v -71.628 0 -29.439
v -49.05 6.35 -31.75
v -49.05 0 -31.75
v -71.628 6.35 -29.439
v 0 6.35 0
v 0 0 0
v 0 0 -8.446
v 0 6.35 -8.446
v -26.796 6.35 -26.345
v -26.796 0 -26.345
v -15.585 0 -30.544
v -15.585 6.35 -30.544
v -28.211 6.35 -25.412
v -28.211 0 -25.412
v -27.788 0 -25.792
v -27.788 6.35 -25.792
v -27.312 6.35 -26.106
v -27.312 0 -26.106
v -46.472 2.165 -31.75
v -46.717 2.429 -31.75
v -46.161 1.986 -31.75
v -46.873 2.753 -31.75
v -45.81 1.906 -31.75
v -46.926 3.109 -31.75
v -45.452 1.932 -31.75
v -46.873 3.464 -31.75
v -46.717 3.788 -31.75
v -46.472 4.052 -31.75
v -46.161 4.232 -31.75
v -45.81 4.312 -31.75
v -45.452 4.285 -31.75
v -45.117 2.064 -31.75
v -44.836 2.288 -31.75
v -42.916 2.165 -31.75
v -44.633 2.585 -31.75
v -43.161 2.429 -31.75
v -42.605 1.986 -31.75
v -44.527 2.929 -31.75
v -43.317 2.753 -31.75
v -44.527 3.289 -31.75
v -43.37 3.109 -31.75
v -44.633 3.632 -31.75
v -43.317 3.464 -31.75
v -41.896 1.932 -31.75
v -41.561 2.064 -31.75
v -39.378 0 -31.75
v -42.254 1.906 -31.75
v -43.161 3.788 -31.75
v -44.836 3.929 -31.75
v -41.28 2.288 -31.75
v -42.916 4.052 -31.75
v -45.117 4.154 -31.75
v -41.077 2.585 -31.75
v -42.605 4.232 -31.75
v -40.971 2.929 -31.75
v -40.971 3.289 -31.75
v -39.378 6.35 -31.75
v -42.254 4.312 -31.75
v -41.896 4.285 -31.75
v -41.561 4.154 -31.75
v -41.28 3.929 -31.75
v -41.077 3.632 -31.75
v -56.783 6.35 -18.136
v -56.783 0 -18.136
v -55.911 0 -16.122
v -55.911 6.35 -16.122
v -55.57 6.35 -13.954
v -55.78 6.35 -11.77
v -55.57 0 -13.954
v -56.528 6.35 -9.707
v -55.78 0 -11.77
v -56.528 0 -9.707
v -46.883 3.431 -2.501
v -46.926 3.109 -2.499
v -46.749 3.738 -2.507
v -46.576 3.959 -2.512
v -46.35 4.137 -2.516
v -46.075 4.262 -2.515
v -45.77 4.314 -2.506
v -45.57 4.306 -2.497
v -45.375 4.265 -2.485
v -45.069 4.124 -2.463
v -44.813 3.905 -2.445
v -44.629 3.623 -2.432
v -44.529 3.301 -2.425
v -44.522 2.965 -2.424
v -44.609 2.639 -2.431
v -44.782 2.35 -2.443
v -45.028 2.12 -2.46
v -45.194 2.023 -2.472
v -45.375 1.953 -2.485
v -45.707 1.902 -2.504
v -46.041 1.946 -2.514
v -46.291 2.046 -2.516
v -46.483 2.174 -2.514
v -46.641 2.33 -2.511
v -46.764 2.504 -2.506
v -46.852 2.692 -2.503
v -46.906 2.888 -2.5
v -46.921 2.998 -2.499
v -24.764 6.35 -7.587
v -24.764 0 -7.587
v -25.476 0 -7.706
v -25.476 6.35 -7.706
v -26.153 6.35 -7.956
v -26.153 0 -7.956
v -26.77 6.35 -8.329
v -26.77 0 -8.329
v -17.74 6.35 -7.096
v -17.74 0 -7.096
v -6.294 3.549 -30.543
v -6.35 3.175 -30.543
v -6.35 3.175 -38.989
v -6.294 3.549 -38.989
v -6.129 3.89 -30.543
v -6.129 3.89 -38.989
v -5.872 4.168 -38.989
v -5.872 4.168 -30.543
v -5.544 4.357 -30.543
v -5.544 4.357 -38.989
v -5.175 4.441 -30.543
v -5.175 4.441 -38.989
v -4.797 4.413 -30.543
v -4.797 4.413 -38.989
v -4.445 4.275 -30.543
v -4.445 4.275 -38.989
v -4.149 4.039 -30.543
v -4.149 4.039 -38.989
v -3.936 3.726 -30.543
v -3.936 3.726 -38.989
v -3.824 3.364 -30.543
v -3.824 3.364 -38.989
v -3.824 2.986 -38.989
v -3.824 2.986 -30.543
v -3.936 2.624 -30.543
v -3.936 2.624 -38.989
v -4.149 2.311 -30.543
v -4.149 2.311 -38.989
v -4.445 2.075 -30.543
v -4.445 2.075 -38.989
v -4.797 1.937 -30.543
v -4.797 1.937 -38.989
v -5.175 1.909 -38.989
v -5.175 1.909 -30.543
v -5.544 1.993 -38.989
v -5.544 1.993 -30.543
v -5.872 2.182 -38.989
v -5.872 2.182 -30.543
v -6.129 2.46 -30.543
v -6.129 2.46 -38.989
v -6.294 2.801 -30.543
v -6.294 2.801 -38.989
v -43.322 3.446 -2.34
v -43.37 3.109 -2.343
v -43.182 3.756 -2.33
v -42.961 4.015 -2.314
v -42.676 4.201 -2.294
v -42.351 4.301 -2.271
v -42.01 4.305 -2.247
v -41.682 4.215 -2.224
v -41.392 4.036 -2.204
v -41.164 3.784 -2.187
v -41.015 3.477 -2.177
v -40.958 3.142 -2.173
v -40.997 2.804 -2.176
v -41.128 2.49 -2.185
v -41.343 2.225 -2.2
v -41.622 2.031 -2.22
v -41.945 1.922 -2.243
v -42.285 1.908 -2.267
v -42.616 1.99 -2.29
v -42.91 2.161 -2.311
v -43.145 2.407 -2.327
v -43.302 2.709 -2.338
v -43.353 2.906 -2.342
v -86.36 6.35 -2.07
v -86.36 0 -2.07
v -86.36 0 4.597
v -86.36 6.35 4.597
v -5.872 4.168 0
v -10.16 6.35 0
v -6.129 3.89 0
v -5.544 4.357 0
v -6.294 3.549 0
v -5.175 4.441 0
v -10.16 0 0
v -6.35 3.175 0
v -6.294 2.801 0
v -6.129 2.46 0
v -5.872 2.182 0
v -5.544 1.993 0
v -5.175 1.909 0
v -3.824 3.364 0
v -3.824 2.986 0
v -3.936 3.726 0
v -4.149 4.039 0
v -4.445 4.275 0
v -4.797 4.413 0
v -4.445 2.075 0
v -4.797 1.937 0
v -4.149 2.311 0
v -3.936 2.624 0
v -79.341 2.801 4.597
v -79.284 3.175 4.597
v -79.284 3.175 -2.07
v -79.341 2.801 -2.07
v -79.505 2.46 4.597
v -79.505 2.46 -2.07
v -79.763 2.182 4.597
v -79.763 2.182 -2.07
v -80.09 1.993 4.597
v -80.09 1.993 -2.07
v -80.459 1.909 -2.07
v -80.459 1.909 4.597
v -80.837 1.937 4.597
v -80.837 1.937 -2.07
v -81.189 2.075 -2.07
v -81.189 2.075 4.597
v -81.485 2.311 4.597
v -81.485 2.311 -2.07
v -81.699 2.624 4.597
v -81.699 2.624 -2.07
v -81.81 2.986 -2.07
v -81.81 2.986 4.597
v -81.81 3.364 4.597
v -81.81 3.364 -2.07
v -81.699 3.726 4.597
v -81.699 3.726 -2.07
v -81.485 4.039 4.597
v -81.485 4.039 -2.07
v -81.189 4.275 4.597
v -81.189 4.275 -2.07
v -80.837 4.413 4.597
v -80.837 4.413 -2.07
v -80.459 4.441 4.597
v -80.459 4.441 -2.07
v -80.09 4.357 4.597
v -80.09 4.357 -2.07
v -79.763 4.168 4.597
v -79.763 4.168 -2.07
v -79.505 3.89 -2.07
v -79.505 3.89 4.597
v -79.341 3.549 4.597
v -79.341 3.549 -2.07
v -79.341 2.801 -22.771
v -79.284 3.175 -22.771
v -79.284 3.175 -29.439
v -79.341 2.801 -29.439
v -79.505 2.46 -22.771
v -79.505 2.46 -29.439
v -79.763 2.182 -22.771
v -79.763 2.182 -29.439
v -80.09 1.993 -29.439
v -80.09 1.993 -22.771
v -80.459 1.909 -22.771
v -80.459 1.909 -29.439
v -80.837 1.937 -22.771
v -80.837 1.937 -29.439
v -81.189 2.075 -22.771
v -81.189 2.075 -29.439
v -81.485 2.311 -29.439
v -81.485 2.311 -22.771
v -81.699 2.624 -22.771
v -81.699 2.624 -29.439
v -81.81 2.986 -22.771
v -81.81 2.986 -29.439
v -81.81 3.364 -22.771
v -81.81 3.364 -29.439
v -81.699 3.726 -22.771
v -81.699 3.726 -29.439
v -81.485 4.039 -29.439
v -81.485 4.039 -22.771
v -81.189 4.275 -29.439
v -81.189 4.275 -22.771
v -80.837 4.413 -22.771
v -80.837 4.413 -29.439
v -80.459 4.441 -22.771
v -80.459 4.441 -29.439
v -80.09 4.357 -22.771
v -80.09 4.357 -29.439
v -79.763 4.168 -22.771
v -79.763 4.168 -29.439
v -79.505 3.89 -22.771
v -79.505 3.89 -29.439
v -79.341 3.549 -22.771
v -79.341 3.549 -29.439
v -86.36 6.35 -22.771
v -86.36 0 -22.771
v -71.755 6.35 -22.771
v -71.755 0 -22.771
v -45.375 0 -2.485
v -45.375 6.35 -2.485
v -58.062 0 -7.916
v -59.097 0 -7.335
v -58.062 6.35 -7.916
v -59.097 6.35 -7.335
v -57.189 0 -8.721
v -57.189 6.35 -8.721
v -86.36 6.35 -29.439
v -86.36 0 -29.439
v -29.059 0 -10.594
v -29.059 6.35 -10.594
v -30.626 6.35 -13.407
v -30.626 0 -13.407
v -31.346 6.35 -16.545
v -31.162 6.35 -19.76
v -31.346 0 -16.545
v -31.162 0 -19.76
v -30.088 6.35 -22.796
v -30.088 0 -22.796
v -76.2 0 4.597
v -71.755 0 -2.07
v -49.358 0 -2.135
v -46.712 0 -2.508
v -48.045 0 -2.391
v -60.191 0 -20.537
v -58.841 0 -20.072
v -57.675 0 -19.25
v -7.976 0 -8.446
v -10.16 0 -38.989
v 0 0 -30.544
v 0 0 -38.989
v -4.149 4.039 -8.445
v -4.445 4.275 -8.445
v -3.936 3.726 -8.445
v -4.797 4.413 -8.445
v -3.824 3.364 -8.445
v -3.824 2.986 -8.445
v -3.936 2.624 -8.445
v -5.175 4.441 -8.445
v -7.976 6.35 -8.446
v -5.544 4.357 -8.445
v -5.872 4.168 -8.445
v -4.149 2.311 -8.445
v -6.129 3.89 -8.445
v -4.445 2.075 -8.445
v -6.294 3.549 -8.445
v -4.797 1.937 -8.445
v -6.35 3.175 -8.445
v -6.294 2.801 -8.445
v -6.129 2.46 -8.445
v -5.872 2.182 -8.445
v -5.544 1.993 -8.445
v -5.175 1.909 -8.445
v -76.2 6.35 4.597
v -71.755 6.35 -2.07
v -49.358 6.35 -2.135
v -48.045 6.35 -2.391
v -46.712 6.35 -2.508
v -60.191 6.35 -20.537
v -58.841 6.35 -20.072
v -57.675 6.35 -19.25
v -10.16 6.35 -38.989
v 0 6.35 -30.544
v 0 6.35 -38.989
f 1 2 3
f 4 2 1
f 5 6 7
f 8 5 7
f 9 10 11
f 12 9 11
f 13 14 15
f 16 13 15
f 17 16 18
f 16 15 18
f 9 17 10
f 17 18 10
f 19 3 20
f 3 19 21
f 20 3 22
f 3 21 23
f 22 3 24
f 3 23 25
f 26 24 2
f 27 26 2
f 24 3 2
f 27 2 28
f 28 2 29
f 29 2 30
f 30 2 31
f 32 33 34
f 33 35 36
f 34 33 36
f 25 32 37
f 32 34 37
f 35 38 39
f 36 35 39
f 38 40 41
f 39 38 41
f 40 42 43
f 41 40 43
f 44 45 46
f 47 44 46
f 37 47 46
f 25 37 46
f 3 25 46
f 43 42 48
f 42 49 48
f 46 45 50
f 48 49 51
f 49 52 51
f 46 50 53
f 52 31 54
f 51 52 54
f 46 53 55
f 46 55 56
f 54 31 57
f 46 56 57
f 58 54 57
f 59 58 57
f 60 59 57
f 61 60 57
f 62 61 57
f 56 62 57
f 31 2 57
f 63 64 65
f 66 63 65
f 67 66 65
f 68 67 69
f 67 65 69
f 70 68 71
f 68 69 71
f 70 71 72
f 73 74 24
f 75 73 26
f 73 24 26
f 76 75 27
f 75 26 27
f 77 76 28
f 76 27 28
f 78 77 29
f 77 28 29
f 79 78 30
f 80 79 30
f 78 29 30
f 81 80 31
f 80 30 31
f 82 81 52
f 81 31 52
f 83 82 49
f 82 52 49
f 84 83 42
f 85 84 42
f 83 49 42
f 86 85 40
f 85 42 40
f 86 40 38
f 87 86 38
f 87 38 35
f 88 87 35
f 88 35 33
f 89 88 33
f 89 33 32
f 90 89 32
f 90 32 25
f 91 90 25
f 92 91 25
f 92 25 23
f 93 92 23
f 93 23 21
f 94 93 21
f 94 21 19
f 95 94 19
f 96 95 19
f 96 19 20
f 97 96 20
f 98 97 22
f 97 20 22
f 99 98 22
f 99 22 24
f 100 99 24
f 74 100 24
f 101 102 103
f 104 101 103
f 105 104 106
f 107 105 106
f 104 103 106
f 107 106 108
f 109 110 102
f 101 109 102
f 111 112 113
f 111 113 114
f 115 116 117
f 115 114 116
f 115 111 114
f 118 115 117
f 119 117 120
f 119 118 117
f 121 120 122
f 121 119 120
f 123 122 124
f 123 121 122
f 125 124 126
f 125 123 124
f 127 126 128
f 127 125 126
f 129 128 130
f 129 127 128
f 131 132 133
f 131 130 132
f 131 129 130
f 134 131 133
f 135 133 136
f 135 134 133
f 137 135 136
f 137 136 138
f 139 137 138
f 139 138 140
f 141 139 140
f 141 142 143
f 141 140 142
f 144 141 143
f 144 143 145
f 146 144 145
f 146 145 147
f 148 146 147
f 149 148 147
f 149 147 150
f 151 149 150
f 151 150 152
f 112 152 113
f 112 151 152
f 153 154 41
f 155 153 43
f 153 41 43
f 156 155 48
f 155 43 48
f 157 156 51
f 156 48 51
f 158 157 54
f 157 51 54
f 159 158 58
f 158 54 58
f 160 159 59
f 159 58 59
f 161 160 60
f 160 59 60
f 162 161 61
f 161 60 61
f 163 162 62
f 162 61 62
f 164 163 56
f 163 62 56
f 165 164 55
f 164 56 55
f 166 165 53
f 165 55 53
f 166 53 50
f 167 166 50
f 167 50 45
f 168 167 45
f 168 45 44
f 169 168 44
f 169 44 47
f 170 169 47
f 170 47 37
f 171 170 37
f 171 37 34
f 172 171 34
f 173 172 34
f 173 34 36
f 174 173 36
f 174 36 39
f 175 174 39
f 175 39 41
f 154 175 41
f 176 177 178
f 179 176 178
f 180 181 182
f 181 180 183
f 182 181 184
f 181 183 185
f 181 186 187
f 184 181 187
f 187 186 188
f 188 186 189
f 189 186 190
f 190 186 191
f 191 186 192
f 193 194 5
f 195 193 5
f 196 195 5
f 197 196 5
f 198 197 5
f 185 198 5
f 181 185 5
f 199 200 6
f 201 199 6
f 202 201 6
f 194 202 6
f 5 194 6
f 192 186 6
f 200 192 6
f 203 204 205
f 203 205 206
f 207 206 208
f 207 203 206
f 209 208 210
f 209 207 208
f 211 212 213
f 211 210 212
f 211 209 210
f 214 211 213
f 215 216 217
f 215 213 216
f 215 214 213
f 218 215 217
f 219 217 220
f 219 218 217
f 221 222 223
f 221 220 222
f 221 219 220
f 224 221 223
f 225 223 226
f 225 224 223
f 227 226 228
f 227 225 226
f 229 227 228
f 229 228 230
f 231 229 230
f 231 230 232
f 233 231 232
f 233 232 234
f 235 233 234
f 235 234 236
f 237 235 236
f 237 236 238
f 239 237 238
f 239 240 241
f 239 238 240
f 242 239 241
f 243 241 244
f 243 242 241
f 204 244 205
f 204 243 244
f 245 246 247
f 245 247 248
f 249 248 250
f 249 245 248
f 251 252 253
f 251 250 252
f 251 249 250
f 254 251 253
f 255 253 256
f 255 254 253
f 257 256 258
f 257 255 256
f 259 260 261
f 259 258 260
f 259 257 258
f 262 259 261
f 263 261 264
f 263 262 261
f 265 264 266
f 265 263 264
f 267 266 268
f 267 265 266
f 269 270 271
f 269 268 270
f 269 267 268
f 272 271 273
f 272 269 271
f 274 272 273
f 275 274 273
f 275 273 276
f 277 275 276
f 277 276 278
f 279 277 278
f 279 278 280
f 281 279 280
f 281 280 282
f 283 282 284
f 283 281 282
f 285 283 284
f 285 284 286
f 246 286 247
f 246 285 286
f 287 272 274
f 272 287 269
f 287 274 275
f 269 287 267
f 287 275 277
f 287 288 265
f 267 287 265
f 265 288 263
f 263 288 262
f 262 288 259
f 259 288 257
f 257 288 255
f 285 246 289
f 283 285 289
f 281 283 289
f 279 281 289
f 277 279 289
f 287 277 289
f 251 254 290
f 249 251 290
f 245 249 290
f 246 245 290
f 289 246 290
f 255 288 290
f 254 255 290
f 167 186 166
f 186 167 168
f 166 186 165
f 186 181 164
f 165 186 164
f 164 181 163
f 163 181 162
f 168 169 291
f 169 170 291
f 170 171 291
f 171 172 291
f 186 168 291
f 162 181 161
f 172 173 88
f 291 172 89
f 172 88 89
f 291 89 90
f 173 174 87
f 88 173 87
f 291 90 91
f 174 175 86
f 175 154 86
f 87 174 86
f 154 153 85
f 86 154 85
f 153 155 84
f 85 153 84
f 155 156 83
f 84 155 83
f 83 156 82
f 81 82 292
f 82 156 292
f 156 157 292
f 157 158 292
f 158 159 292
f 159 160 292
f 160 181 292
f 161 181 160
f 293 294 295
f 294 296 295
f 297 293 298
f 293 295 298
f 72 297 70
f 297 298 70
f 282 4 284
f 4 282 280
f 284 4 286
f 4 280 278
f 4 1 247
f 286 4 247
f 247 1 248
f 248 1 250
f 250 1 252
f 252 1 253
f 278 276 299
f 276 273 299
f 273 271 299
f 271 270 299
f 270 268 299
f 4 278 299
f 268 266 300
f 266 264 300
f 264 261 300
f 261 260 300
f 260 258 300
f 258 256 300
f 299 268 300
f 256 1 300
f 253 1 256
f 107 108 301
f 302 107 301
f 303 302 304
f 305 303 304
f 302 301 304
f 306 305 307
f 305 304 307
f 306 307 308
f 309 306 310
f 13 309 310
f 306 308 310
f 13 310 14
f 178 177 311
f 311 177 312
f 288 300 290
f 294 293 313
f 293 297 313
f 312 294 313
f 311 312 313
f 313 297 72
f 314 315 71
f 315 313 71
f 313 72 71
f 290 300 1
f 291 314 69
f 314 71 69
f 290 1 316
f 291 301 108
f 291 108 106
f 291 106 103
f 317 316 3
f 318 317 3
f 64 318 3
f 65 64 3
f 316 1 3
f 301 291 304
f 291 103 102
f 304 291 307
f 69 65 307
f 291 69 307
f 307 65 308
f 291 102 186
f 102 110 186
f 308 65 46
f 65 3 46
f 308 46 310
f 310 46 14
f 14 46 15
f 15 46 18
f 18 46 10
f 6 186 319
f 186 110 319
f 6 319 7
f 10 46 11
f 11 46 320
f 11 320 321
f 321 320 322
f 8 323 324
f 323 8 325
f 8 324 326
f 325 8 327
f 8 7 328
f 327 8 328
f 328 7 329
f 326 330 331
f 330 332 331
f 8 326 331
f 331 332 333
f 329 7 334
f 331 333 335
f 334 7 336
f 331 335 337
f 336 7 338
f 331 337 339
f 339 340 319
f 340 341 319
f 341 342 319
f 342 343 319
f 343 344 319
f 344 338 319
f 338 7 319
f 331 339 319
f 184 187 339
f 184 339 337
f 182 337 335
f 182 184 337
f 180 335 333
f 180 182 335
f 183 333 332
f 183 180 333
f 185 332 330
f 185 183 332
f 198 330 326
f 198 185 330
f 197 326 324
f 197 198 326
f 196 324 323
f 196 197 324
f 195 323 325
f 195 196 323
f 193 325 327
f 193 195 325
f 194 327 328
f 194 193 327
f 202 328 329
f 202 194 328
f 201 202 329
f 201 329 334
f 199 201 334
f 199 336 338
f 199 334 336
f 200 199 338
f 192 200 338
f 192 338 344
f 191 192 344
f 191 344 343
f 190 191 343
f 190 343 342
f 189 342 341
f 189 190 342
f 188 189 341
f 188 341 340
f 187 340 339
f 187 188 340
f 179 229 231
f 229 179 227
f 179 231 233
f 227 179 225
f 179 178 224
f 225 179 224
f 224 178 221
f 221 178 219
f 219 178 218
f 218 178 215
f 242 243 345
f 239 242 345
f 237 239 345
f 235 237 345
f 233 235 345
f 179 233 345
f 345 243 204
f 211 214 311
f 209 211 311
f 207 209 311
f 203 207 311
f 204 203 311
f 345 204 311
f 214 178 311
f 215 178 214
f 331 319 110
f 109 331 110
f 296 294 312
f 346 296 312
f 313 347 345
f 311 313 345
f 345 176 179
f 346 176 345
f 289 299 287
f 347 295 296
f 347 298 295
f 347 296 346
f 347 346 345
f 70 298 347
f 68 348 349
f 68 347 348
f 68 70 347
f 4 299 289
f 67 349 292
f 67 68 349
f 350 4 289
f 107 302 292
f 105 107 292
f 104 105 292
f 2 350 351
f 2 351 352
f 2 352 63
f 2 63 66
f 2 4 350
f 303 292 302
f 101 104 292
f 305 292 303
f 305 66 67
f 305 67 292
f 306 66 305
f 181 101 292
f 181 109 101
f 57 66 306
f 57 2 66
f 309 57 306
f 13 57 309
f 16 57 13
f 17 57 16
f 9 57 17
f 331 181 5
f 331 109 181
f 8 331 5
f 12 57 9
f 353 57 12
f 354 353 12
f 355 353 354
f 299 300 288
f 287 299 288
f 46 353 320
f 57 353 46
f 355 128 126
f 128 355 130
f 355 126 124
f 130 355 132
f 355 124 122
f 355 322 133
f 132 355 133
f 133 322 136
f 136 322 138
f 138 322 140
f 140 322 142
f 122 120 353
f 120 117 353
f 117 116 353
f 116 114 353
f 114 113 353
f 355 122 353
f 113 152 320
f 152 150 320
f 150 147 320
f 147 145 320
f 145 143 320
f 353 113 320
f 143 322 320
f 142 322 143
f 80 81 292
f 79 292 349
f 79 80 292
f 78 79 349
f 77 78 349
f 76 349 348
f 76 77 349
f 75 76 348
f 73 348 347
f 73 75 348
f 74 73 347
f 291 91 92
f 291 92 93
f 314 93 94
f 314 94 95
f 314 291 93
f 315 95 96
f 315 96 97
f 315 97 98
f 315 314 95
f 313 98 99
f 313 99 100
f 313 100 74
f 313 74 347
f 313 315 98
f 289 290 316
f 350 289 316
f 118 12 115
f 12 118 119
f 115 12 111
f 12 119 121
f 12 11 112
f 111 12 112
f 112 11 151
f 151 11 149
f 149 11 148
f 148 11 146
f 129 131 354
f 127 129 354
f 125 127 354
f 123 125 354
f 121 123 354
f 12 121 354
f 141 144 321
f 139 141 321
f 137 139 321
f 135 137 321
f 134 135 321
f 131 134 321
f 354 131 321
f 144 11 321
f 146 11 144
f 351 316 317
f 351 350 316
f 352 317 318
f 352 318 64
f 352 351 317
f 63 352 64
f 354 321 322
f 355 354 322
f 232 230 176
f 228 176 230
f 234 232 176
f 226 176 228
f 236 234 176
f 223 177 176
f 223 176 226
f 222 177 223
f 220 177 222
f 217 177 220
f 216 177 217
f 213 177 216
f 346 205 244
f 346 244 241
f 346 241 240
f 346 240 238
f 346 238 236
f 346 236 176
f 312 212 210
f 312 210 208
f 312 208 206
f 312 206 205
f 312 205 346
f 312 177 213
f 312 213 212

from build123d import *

# Parameters (mm, degrees)
BOSS_EXTRUDE1_DEPTH     = 6.35
CUT_EXTRUDE2_DEPTH      = 95.416035655
CUT_EXTRUDE2_DEPTH_BACK = 95.416035655
SKETCH2_R               = 1.27
CUT_EXTRUDE5_DEPTH      = 95.965858186
CUT_EXTRUDE7_DEPTH      = 25.4
SKETCH6_W               = 10.4785697
SKETCH6_H               = 6.35
SKETCH6_R               = 1.0795
BOSS_EXTRUDE2_DEPTH     = 12.7
FILLET5_R               = 12.7
FILLET6_R               = 5.08
BOSS_EXTRUDE3_DEPTH     = 6.35
SKETCH10_R              = 1.2065
CUT_EXTRUDE9_DEPTH      = 94.912222776
SKETCH12_W              = 15.691210344
SKETCH12_H              = 20.701
CUT_EXTRUDE10_DEPTH     = 95.965858193


with BuildPart() as part:
    # Sketch1 → Boss-Extrude1 (new body)
    with BuildSketch(Plane(origin=(0, 0, 0), x_dir=(1, 0, 0), z_dir=(0, 1, 0))):
        Polygon((0, 0), (0, 38.989), (-10.16, 38.989), (-71.628, 29.4386), (-86.36, 29.4386), (-86.36, -4.5974), (-76.2, -4.5974), (-10.16, 0), align=None)
    extrude(amount=BOSS_EXTRUDE1_DEPTH)

    # Sketch2 → Cut-Extrude2 (cut, two sides: drawn at the far end of the back side and taken through both)
    with BuildSketch(Plane(origin=(-0.604981675, 0, 0), x_dir=(-1, 0, 0), z_dir=(0, 0, -1)).offset(-CUT_EXTRUDE2_DEPTH_BACK)):
        with Locations((4.475018325, 3.175)):
            Circle(SKETCH2_R)
        with Locations(Location((79.949388362, 3.175, 0), (0, 0, 180))):
            Circle(SKETCH2_R)
    extrude(amount=CUT_EXTRUDE2_DEPTH + CUT_EXTRUDE2_DEPTH_BACK, mode=Mode.SUBTRACT)

    # Sketch3 → Cut-Extrude5 (cut, through all)
    with BuildSketch(Plane(origin=(0, 0, 0), x_dir=(1, 0, 0), z_dir=(0, 1, 0))):
        with BuildLine():
            Line((-81.915, 22.7711), (-71.755, 22.7711))
            Line((-71.755, 22.7711), (-58.487579402, 20.207642468))
            ThreePointArc((-58.487579402, 20.207642468), (-55.580114305, 14.192748547), (-57.777398298, 7.883687982))
            Line((-57.777398298, 7.883687982), (-71.755, 2.0701))
            Line((-71.755, 2.0701), (-81.915, 2.0701))
            Line((-81.915, 2.0701), (-81.915, 22.7711))
        make_face()
        with BuildLine():
            Line((0, 30.5435), (0, 8.4455))
            Line((0, 8.4455), (-7.9756, 8.4455))
            Line((-7.9756, 8.4455), (-17.739567161, 7.096263095))
            Line((-17.739567161, 7.096263095), (-24.764375431, 7.587485542))
            ThreePointArc((-24.764375431, 7.587485542), (-25.820245836, 7.814780317), (-26.769908004, 8.32923828))
            ThreePointArc((-26.769908004, 8.32923828), (-31.345543526, 16.545378703), (-28.210906636, 25.41191441))
            ThreePointArc((-28.210906636, 25.41191441), (-27.55579932, 25.957953915), (-26.795645997, 26.34459543))
            Line((-26.795645997, 26.34459543), (-15.585156538, 30.5435))
            Line((-15.585156538, 30.5435), (-7.9756, 30.5435))
            Line((-7.9756, 30.5435), (0, 30.5435))
        make_face()
    extrude(amount=CUT_EXTRUDE5_DEPTH, mode=Mode.SUBTRACT)

    # Sketch5 → Cut-Extrude7 (cut)
    with BuildSketch(Plane(origin=(0, 6.35, 0), x_dir=(1, 0, 0), z_dir=(0, 1, 0))):
        Polygon((-10.16, 38.989), (-53.78735915, 28.179846815), (-71.628, 29.4386), align=None)
        Polygon((-10.16, 0), (-47.394119509, 2.627067431), (-76.2, -4.5974), align=None)
    extrude(amount=-CUT_EXTRUDE7_DEPTH, mode=Mode.SUBTRACT)

    # Sketch6 → Boss-Extrude2 (add)
    with BuildSketch(Plane.XY.offset(-31.75)):
        with Locations((-43.810886798, 3.175)):
            Rectangle(SKETCH6_W, SKETCH6_H)
        with Locations((-45.72, 3.108706623)):
            Circle(SKETCH6_R, mode=Mode.SUBTRACT)
        with Locations((-42.164, 3.108706623)):
            Circle(SKETCH6_R, mode=Mode.SUBTRACT)
    extrude(amount=BOSS_EXTRUDE2_DEPTH)

    # Fillet5
    fillet5_edges = [part.edges().sort_by_distance(p)[0] for p in [
        (-47.394119509, 3.175, -2.627067431),
        (-53.78735915, 3.175, -28.179846815),
    ]]
    fillet(fillet5_edges, radius=FILLET5_R)

    # Fillet6
    fillet6_edges = [part.edges().sort_by_distance(p)[0] for p in [
        (-57.777398298, 3.175, -7.883687982),
        (-58.487579402, 3.175, -20.207642468),
    ]]
    fillet(fillet6_edges, radius=FILLET6_R)

    # Sketch9 → Boss-Extrude3 (add)
    with BuildSketch(Plane(origin=(0, 6.35, 0), x_dir=(1, 0, 0), z_dir=(0, 1, 0))):
        Polygon((-49.050171648, 31.75), (-71.628, 29.4386), (-71.628, 26.697361781), (-49.050171648, 26.697361781), align=None)
    extrude(amount=-BOSS_EXTRUDE3_DEPTH)

    # Sketch10 → Cut-Extrude9 (cut, through all)
    with BuildSketch(Plane(origin=(0, 0, -31.75), x_dir=(-1, 0, 0), z_dir=(0, 0, -1))):
        with Locations((42.164, 3.108706623)):
            Circle(SKETCH10_R)
        with Locations((45.72, 3.108706623)):
            Circle(SKETCH10_R)
    extrude(amount=-CUT_EXTRUDE9_DEPTH, mode=Mode.SUBTRACT)

    # Sketch12 → Cut-Extrude10 (cut, through all)
    with BuildSketch(Plane(origin=(0, 0, 0), x_dir=(1, 0, 0), z_dir=(0, 1, 0))):
        with Locations((-89.760605172, 12.4206)):
            Rectangle(SKETCH12_W, SKETCH12_H)
    extrude(amount=CUT_EXTRUDE10_DEPTH, mode=Mode.SUBTRACT)


solid = part.part
